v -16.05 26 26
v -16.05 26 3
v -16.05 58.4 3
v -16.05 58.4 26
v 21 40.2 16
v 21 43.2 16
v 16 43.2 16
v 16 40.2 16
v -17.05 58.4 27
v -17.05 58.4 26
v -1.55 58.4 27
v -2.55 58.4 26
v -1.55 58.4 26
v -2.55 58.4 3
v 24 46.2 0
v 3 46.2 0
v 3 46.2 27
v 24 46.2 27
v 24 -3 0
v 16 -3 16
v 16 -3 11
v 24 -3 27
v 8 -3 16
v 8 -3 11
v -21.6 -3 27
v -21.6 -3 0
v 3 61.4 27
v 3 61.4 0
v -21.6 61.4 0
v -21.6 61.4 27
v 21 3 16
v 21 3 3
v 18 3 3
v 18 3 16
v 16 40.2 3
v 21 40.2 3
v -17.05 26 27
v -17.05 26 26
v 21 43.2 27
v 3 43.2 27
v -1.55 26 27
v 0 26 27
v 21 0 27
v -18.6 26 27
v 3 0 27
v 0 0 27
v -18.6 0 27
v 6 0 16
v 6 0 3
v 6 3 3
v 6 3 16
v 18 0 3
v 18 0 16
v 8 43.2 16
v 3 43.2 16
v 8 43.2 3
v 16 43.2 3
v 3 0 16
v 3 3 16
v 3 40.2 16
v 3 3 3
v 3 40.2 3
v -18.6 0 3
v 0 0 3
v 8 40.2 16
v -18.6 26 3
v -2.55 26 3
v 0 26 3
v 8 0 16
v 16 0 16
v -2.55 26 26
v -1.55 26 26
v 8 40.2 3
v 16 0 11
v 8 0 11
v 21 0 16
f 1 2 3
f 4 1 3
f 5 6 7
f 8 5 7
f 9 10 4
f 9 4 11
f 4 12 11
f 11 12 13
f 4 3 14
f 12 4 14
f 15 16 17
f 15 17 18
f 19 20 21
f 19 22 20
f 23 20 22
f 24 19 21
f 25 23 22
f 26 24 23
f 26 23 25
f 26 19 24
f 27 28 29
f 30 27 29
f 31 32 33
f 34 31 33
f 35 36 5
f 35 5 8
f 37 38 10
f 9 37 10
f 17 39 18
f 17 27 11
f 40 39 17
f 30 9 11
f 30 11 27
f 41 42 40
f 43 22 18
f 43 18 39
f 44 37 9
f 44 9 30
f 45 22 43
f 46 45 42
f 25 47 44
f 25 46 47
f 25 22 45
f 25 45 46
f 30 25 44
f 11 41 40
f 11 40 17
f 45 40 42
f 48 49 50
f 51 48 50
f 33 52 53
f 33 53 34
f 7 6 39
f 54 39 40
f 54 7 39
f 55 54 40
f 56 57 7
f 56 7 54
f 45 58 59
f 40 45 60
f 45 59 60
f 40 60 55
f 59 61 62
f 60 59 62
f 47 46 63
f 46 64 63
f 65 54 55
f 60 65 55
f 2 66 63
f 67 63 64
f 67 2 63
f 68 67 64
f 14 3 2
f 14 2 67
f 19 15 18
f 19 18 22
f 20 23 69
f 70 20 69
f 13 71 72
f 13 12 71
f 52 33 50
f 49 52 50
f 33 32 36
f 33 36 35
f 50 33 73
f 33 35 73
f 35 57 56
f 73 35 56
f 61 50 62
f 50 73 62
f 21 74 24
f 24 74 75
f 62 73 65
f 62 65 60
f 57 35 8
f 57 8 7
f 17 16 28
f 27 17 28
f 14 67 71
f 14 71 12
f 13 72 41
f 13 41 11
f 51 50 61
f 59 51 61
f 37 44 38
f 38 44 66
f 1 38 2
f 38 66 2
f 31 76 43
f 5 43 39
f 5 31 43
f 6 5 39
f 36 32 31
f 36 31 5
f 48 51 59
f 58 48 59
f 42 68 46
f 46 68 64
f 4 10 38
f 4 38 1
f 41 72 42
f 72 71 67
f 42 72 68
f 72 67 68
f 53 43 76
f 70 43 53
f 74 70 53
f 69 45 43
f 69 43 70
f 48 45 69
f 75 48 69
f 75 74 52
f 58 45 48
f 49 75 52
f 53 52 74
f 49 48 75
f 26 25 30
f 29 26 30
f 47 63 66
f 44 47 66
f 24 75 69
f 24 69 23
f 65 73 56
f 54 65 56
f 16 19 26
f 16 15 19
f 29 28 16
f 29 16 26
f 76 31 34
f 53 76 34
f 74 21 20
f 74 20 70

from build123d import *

# Parameters (mm, degrees)
SKETCH1_W            = 24.6
SKETCH1_H            = 64.4
BOSS_EXTRUDE1_DEPTH  = 3
SKETCH1_5_W          = 24.6
SKETCH1_5_H          = 64.4
BOSS_EXTRUDE2_DEPTH  = 26
BOSS_EXTRUDE4_DEPTH  = 35
SKETCH1_8_W          = 24.6
SKETCH1_8_H          = 64.4
BOSS_EXTRUDE5_DEPTH  = 27
BOSS_EXTRUDE6_DEPTH  = 3
BOSS_EXTRUDE7_DEPTH  = 2
SKETCH2_4_W          = 8
SKETCH2_4_H          = 3
BOSS_EXTRUDE8_DEPTH  = 11
SKETCH2_5_W          = 5
SKETCH2_5_H          = 3
BOSS_EXTRUDE9_DEPTH  = 27
SKETCH5_W            = 33.6
SKETCH5_H            = 60.4
BOSS_EXTRUDE11_DEPTH = 3
SKETCH5_5_W          = 30.618778274
SKETCH5_5_H          = 54.4
CUT_EXTRUDE3_DEPTH   = 3
BOSS_EXTRUDE12_DEPTH = 27
SKETCH6_W            = 30.618778274
SKETCH6_H            = 47.4
BOSS_EXTRUDE13_DEPTH = 3
SKETCH7_W            = 24.6
SKETCH7_H            = 8
CUT_EXTRUDE4_DEPTH   = 3
SKETCH8_W            = 11
SKETCH8_H            = 3
BOSS_EXTRUDE14_DEPTH = 8
SKETCH2_6_W          = 3
SKETCH2_6_H          = 3
SKETCH2_6_W_2        = 5
BOSS_EXTRUDE15_DEPTH = 16
SKETCH9_W            = 36.6
SKETCH9_H            = 3
BOSS_EXTRUDE16_DEPTH = 15
SKETCH10_W           = 18.8
SKETCH10_H           = 11.60179211
CUT_EXTRUDE5_DEPTH   = 15
BOSS_EXTRUDE17_DEPTH = 3
BOSS_EXTRUDE18_DEPTH = 3
SKETCH13_W           = 33.6
SKETCH13_H           = 60.4
CUT_EXTRUDE6_DEPTH   = 70
CUT_EXTRUDE7_DEPTH   = 70


with BuildPart() as part:
    # Sketch1 → Boss-Extrude1 (new body)
    with BuildSketch(Plane.XY):
        with Locations((-9.3, 29.2)):
            Rectangle(SKETCH1_W, SKETCH1_H)
    extrude(amount=BOSS_EXTRUDE1_DEPTH)

    # Sketch1<5> → Boss-Extrude2 (add)
    with BuildSketch(Plane.XY):
        with Locations((-9.3, 29.2)):
            Rectangle(SKETCH1_5_W, SKETCH1_5_H)
        Polygon((0, 0), (-18.6, 0), (-18.6, 26), (-16.05, 26), (-16.05, 58.4), (-2.55, 58.4), (-2.55, 26), (0, 26), align=None, mode=Mode.SUBTRACT)
    extrude(amount=BOSS_EXTRUDE2_DEPTH)

    # Sketch1<7> → Boss-Extrude4 (add)
    with BuildSketch(Plane.XY):
        Polygon((3, 0), (0, 0), (-18.6, 0), (-21.6, 0), (-21.6, -3), (3, -3), align=None)
    extrude(amount=BOSS_EXTRUDE4_DEPTH)

    # Sketch1<8> → Boss-Extrude5 (add)
    with BuildSketch(Plane.XY):
        with Locations((-9.3, 29.2)):
            Rectangle(SKETCH1_8_W, SKETCH1_8_H)
        Polygon((0, 0), (-18.6, 0), (-18.6, 26), (-17.05, 26), (-17.05, 58.4), (-1.55, 58.4), (-1.55, 26), (0, 26), align=None, mode=Mode.SUBTRACT)
    extrude(amount=BOSS_EXTRUDE5_DEPTH)

    # Sketch2 → Boss-Extrude6 (add)
    with BuildSketch(Plane(origin=(0, 0, 0), x_dir=(-1, 0, 0), z_dir=(0, 0, -1))):
        Polygon((-8, 0), (-6, 0), (-6, 3), (-3, 3), (-3, 40.2), (-8, 40.2), (-8, 43.2), (-16, 43.2), (-16, 40.2), (-21, 40.2), (-21, 3), (-18, 3), (-18, 0), (-16, 0), align=None)
    extrude(amount=-BOSS_EXTRUDE6_DEPTH)

    # Sketch2<3> → Boss-Extrude7 (add)
    with BuildSketch(Plane(origin=(0, 0, 0), x_dir=(-1, 0, 0), z_dir=(0, 0, -1))):
        Polygon((-3, -3), (-3, 3), (-6, 3), (-6, 0), (-8, 0), (-8, -3), align=None)
        Polygon((-8, 40.2), (-3, 40.2), (-3, 46.2), (-24, 46.2), (-24, -3), (-16, -3), (-16, 0), (-18, 0), (-18, 3), (-21, 3), (-21, 40.2), (-16, 40.2), (-16, 43.2), (-8, 43.2), align=None)
    extrude(amount=-BOSS_EXTRUDE7_DEPTH)

    # Sketch2<4> → Boss-Extrude8 (add)
    with BuildSketch(Plane(origin=(0, 0, 0), x_dir=(-1, 0, 0), z_dir=(0, 0, -1))):
        with Locations((-12, -1.5)):
            Rectangle(SKETCH2_4_W, SKETCH2_4_H)
    extrude(amount=-BOSS_EXTRUDE8_DEPTH)

    # Sketch2<5> → Boss-Extrude9 (add)
    with BuildSketch(Plane(origin=(0, 0, 0), x_dir=(-1, 0, 0), z_dir=(0, 0, -1))):
        with Locations((-5.5, -1.5)):
            Rectangle(SKETCH2_5_W, SKETCH2_5_H)
        Polygon((-16, -3), (-16, 0), (-21, 0), (-21, 43.2), (-3, 43.2), (-3, 46.2), (-24, 46.2), (-24, -3), align=None)
    extrude(amount=-BOSS_EXTRUDE9_DEPTH)

    # Sketch5 → Boss-Extrude11 (add)
    with BuildSketch(Plane(origin=(0, 0, 0), x_dir=(-1, 0, 0), z_dir=(0, 0, -1))):
        with Locations((38.4, 27.2)):
            Rectangle(SKETCH5_W, SKETCH5_H)
    extrude(amount=-BOSS_EXTRUDE11_DEPTH)

    # Sketch5<5> → Cut-Extrude3 (cut)
    with BuildSketch(Plane(origin=(0, 0, 0), x_dir=(-1, 0, 0), z_dir=(0, 0, -1))):
        with Locations((36.909389137, 27.2)):
            Rectangle(SKETCH5_5_W, SKETCH5_5_H)
    extrude(amount=-CUT_EXTRUDE3_DEPTH, mode=Mode.SUBTRACT)

    # Sketch5<6> → Boss-Extrude12 (add)
    with BuildSketch(Plane(origin=(0, 0, 0), x_dir=(-1, 0, 0), z_dir=(0, 0, -1))):
        Polygon((21.6, 0), (21.6, -3), (55.2, -3), (55.2, 57.4), (21.6, 57.4), (21.6, 54.4), (52.218778274, 54.4), (52.218778274, 0), align=None)
    extrude(amount=-BOSS_EXTRUDE12_DEPTH)

    # Sketch6 → Boss-Extrude13 (add)
    with BuildSketch(Plane.XY.offset(27)):
        with Locations((-36.909389137, 23.7)):
            Rectangle(SKETCH6_W, SKETCH6_H)
    extrude(amount=-BOSS_EXTRUDE13_DEPTH)

    # Sketch7 → Cut-Extrude4 (cut)
    with BuildSketch(Plane.XZ.offset(3)):
        with Locations((-9.3, 31)):
            Rectangle(SKETCH7_W, SKETCH7_H)
    extrude(amount=-CUT_EXTRUDE4_DEPTH, mode=Mode.SUBTRACT)

    # Sketch8 → Boss-Extrude14 (add)
    with BuildSketch(Plane(origin=(8, 0, 0), x_dir=(0, 0, -1), z_dir=(1, 0, 0))):
        with Locations((-21.5, -1.5)):
            Rectangle(SKETCH8_W, SKETCH8_H)
    extrude(amount=BOSS_EXTRUDE14_DEPTH)

    # Sketch2<6> → Boss-Extrude15 (add)
    with BuildSketch(Plane(origin=(0, 0, 0), x_dir=(-1, 0, 0), z_dir=(0, 0, -1))):
        with Locations((-4.5, 1.5)):
            Rectangle(SKETCH2_6_W, SKETCH2_6_H)
        with Locations((-5.5, 41.7)):
            Rectangle(SKETCH2_6_W_2, SKETCH2_6_H)
        with Locations((-19.5, 1.5)):
            Rectangle(SKETCH2_6_W, SKETCH2_6_H)
        with Locations((-18.5, 41.7)):
            Rectangle(SKETCH2_6_W_2, SKETCH2_6_H)
    extrude(amount=-BOSS_EXTRUDE15_DEPTH)

    # Sketch9 → Boss-Extrude16 (add)
    with BuildSketch(Plane.XY.offset(27)):
        with Locations((-36.9, -1.5)):
            Rectangle(SKETCH9_W, SKETCH9_H)
    extrude(amount=BOSS_EXTRUDE16_DEPTH)

    # Sketch10 → Cut-Extrude5 (cut)
    with BuildSketch(Plane(origin=(0, -3, 0), x_dir=(-1, 0, 0), z_dir=(0, -1, 0))):
        with Locations((39.656308117, -34.500896055)):
            Rectangle(SKETCH10_W, SKETCH10_H)
    extrude(amount=-CUT_EXTRUDE5_DEPTH, mode=Mode.SUBTRACT)

    # Sketch11 → Boss-Extrude17 (add)
    with BuildSketch(Plane(origin=(0, -3, 0), x_dir=(-1, 0, 0), z_dir=(0, -1, 0))):
        Polygon((18.6, -42), (18.6, -27), (3.6, -27), align=None)
    extrude(amount=-BOSS_EXTRUDE17_DEPTH)

    # Sketch12 → Boss-Extrude18 (add)
    with BuildSketch(Plane.ZY.offset(55.2)):
        Polygon((27, 0), (42, 0), (27, 15), align=None)
    extrude(amount=-BOSS_EXTRUDE18_DEPTH)

    # Sketch13 → Cut-Extrude6 (cut)
    with BuildSketch(Plane.XY.offset(42)):
        with Locations((-38.4, 27.2)):
            Rectangle(SKETCH13_W, SKETCH13_H)
    extrude(amount=-CUT_EXTRUDE6_DEPTH, mode=Mode.SUBTRACT)

    # Sketch14 → Cut-Extrude7 (cut)
    with BuildSketch(Plane(origin=(0, -3, 0), x_dir=(-1, 0, 0), z_dir=(0, -1, 0))):
        Polygon((3.6, -27), (21.6, -27), (21.6, -42), (18.6, -42), align=None)
    extrude(amount=-CUT_EXTRUDE7_DEPTH, mode=Mode.SUBTRACT)


solid = part.part
